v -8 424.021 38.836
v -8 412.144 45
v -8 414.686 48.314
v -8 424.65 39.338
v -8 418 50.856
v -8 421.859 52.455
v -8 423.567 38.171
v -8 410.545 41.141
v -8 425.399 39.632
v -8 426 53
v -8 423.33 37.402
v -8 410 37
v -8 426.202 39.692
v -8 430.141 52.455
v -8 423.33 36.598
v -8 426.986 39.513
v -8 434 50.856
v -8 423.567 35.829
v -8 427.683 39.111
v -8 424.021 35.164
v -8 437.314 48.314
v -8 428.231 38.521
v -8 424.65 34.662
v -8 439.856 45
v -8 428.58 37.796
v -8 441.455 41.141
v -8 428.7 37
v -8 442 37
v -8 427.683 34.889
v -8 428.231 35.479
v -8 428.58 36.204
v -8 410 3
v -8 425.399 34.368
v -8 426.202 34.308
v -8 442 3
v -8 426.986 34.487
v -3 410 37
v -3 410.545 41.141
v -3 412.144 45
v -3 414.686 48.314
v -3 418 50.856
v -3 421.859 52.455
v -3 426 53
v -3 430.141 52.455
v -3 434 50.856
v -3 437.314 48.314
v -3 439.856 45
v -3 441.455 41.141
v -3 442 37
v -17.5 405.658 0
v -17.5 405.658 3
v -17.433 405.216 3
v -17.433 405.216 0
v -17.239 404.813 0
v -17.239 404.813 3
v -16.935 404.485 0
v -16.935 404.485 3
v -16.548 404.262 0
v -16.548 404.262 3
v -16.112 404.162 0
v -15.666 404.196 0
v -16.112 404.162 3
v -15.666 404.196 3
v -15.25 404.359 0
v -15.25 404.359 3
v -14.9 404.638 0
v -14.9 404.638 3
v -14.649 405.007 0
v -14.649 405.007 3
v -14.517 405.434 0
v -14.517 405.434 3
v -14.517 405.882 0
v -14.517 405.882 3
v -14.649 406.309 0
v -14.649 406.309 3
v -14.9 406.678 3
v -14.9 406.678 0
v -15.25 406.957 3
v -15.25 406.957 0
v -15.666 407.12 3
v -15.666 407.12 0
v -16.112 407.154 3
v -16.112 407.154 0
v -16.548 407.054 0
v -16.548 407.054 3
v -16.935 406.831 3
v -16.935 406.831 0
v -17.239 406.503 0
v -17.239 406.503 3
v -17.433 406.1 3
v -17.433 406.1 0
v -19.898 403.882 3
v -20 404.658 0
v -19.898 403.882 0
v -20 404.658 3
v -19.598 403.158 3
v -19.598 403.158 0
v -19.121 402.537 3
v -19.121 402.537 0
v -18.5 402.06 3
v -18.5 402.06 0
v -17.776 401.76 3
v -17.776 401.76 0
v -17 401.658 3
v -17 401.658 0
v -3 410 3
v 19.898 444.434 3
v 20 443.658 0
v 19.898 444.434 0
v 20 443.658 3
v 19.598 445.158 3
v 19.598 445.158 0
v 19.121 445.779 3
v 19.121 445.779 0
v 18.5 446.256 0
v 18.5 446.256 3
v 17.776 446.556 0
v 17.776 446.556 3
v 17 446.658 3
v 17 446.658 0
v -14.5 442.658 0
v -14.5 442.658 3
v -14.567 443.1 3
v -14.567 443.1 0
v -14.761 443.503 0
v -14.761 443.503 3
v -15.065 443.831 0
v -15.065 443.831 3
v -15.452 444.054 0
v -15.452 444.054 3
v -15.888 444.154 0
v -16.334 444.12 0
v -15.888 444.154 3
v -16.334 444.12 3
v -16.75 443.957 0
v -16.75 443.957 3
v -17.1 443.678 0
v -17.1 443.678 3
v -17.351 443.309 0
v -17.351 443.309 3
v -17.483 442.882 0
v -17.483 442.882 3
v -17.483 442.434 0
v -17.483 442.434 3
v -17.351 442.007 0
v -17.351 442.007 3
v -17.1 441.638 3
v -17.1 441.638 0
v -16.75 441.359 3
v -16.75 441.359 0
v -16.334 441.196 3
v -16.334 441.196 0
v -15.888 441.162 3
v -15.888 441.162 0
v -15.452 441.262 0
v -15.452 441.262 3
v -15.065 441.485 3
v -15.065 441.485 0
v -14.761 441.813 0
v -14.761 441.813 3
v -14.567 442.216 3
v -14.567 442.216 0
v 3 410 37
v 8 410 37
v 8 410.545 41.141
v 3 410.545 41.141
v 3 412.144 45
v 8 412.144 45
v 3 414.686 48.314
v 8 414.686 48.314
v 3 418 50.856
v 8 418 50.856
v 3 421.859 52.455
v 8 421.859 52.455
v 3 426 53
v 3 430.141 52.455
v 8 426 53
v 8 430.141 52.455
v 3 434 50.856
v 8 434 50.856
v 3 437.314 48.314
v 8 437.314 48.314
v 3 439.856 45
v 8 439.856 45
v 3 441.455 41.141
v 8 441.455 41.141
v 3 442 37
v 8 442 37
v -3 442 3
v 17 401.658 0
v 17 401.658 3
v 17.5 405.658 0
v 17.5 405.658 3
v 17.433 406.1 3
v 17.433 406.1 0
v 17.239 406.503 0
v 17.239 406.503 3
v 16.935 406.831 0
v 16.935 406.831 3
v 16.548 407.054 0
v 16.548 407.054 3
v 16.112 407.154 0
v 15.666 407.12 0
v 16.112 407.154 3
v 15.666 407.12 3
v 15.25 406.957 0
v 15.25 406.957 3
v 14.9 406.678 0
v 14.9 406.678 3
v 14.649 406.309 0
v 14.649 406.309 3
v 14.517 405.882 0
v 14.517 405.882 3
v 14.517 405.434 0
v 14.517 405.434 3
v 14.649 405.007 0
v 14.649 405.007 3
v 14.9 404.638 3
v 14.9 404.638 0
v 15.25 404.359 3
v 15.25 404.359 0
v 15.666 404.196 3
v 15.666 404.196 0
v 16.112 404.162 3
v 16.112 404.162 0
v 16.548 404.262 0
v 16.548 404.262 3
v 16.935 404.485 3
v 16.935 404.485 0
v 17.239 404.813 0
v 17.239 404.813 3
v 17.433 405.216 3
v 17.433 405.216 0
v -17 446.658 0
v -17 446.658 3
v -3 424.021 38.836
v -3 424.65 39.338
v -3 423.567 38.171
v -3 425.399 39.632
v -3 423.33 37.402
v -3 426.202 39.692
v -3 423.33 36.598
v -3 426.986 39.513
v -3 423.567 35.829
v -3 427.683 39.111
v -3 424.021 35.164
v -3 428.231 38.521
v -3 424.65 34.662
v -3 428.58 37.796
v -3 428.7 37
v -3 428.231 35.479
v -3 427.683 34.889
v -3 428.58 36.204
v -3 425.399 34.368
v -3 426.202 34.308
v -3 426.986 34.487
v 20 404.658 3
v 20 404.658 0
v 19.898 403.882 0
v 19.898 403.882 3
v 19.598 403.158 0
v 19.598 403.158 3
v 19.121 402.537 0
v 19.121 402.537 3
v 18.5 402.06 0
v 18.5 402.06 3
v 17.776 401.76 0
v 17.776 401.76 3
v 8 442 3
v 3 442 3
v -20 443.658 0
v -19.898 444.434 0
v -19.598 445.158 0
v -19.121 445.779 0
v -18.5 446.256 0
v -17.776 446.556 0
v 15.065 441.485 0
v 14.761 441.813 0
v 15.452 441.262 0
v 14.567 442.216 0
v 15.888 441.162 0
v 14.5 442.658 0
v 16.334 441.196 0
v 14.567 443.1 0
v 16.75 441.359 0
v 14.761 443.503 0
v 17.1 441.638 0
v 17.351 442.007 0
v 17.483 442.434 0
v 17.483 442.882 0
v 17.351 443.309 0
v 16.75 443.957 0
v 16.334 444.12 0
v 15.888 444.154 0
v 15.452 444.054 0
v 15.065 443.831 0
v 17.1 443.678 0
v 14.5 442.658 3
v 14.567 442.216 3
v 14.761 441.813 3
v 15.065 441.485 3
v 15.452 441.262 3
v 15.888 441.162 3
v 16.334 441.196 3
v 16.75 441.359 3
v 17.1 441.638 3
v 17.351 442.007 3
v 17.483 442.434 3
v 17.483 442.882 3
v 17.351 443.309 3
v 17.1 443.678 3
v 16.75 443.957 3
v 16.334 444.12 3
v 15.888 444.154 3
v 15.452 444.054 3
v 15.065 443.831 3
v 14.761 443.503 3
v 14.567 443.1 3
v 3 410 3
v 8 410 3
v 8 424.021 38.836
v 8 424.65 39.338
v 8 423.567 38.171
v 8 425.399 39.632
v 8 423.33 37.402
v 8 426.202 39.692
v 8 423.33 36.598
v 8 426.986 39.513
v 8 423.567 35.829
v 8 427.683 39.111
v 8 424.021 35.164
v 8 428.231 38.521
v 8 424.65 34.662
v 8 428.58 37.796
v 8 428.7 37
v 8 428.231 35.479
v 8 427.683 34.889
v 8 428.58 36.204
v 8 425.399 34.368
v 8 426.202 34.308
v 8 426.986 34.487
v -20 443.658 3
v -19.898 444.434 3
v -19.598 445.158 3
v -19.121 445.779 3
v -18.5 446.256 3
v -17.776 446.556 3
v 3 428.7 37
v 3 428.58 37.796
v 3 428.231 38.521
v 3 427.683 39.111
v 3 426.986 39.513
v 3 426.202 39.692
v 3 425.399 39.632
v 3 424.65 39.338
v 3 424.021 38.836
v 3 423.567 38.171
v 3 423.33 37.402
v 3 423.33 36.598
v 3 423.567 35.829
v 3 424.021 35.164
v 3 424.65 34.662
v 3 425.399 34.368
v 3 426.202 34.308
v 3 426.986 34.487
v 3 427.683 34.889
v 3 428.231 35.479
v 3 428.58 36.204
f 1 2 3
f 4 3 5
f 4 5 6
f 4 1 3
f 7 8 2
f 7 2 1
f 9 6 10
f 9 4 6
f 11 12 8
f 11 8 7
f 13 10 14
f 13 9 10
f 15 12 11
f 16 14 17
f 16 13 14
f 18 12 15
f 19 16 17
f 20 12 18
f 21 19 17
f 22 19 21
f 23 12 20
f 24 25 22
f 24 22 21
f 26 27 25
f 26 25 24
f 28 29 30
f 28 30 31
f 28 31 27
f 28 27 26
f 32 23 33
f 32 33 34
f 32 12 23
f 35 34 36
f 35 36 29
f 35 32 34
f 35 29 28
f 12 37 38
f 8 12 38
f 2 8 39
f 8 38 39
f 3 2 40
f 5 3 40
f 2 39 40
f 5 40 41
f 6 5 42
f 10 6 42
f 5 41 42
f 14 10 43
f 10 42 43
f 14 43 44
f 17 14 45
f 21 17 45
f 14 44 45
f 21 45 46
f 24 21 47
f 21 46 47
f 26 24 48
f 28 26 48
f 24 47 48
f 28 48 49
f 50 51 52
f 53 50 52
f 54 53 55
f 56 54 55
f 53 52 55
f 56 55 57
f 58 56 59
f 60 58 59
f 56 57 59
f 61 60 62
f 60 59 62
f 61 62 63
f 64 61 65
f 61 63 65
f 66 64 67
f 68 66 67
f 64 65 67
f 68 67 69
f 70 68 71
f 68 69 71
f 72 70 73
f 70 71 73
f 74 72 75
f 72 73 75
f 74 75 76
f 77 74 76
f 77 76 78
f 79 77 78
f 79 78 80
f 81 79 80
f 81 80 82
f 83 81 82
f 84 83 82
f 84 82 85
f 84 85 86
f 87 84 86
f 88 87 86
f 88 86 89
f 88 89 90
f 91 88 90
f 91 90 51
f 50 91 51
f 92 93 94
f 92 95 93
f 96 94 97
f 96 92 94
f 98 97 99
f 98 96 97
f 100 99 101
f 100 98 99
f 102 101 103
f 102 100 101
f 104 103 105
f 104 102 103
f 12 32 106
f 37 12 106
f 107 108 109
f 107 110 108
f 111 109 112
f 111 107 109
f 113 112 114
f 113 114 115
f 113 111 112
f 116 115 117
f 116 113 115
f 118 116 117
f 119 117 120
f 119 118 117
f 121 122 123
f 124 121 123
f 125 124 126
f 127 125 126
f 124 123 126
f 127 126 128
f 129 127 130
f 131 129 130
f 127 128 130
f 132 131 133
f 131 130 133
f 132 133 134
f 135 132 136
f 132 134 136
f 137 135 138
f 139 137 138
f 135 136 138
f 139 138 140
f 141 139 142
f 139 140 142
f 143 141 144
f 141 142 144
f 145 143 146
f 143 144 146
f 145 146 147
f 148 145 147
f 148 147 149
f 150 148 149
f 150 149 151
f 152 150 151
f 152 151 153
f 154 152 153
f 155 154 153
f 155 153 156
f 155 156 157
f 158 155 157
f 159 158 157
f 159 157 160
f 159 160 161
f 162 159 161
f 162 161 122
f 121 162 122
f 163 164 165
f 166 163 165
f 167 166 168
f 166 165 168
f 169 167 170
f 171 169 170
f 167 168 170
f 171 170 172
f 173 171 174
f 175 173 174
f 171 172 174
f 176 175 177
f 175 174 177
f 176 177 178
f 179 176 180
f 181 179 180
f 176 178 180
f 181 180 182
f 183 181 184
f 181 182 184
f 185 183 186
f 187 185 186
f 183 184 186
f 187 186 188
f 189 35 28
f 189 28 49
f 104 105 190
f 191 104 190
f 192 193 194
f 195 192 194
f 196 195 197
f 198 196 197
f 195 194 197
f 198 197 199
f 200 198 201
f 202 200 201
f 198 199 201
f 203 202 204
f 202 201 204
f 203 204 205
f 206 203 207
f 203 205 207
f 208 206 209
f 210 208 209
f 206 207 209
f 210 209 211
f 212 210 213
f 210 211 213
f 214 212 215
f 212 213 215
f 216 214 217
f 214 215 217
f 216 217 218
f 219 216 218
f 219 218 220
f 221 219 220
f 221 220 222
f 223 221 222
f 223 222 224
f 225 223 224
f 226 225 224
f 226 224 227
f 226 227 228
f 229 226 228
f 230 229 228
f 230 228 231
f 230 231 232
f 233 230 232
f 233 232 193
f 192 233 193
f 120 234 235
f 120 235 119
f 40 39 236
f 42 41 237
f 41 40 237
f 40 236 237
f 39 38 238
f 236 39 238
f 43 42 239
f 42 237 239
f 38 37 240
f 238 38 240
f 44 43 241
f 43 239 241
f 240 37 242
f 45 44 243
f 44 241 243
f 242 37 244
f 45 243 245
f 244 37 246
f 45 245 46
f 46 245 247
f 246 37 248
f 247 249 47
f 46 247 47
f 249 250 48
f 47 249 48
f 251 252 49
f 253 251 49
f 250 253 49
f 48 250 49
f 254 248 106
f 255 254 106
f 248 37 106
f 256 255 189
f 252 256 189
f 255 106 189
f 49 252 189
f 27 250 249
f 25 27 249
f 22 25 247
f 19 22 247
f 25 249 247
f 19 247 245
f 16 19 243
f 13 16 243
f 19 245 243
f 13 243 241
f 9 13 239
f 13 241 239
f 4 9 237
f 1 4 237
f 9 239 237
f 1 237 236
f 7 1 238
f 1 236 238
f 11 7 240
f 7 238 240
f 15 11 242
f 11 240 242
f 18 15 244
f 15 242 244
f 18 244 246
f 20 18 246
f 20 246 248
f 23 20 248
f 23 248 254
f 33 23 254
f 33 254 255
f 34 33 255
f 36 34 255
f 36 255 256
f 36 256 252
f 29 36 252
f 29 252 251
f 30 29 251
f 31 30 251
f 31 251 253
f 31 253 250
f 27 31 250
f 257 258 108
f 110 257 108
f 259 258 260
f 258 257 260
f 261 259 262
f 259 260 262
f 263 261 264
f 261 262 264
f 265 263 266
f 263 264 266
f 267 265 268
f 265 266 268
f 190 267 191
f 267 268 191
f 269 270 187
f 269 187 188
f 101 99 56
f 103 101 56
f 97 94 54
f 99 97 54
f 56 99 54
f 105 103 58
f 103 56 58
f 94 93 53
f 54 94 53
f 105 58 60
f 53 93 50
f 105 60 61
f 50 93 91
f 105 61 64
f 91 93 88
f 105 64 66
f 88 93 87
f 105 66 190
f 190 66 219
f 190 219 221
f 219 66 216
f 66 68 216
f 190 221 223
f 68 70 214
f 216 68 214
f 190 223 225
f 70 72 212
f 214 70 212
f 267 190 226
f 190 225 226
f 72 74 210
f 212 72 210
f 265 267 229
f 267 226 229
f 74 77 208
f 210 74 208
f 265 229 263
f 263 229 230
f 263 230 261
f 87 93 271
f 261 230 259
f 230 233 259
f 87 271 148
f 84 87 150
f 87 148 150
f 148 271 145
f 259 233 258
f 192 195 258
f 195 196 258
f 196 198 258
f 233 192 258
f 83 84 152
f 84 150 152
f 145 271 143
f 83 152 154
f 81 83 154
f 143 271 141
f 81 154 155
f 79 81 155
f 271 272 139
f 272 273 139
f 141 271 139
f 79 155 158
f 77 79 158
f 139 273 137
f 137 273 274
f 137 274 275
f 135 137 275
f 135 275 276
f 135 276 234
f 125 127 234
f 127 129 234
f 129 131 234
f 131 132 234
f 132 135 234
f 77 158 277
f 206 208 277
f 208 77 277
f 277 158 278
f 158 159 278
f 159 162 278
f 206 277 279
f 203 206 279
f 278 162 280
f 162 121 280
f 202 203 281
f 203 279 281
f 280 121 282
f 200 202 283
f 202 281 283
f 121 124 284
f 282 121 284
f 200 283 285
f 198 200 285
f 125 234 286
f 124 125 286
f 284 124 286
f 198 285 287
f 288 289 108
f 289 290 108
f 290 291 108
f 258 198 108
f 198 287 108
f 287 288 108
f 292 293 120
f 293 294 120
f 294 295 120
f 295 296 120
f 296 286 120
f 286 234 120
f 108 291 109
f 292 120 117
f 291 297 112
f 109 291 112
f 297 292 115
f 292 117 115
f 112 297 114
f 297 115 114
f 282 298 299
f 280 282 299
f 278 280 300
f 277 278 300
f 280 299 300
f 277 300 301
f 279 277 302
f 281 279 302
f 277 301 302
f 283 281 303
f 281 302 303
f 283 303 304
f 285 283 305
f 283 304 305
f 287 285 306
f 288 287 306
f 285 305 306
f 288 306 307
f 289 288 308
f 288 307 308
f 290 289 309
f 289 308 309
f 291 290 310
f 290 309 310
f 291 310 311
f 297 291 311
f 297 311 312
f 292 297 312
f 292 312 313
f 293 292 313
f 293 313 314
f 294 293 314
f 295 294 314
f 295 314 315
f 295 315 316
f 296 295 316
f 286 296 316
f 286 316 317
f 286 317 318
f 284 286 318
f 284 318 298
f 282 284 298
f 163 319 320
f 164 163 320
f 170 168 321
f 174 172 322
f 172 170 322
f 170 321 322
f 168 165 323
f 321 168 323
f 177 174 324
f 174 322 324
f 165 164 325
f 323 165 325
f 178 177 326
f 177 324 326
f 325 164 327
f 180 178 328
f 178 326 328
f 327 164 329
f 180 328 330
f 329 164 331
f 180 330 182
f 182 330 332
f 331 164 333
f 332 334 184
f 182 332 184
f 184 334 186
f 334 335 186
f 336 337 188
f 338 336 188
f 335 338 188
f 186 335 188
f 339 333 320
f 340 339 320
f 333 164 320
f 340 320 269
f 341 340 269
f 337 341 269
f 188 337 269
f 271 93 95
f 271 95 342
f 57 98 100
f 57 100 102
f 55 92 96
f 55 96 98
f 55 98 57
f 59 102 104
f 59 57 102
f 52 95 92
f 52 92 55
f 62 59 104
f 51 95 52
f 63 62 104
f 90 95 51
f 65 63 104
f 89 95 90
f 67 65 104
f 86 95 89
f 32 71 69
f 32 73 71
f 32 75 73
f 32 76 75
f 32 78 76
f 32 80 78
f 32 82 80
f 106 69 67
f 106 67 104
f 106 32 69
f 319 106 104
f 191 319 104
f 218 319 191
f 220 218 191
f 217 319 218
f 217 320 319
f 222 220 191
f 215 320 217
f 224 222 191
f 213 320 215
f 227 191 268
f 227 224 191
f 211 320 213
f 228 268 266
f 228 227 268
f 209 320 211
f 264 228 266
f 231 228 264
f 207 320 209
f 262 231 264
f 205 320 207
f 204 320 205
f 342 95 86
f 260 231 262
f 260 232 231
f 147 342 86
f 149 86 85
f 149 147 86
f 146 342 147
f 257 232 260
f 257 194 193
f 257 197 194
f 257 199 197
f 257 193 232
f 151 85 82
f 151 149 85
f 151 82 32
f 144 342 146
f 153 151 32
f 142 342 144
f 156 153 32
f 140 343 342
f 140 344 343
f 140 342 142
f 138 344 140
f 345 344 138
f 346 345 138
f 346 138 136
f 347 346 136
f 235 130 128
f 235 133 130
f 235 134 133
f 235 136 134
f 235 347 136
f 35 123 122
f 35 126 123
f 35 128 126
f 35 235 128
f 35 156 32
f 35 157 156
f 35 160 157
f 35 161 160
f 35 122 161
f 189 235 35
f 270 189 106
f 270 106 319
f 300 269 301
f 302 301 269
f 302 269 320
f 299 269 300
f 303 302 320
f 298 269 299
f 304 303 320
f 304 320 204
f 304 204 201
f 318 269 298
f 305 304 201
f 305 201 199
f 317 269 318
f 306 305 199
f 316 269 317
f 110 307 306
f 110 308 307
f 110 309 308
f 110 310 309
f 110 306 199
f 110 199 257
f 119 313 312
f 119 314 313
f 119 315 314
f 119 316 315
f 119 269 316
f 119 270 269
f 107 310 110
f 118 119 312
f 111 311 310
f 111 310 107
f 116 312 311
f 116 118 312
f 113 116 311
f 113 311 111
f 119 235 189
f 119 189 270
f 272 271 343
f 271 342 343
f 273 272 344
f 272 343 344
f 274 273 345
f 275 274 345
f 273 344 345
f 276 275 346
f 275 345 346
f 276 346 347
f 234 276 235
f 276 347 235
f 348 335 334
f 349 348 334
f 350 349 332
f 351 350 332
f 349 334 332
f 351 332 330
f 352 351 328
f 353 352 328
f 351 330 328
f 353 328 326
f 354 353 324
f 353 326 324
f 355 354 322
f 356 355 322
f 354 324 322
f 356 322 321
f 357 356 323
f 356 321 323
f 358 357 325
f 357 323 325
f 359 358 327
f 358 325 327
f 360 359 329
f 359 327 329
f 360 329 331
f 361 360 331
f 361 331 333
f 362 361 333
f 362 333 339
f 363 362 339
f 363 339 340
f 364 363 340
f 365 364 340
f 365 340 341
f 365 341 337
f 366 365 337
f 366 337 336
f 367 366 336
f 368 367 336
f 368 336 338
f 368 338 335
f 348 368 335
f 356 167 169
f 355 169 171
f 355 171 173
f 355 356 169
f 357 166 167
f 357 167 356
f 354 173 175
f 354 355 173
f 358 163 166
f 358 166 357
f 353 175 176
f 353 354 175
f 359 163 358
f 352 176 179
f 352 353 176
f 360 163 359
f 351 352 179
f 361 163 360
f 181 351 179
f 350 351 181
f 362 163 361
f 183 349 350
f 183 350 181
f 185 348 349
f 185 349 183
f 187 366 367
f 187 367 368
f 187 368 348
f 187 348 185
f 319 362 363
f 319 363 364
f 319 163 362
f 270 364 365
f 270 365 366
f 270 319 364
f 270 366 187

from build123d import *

# Parameters (mm, degrees)
SKETCH1_W           = 40
SKETCH1_H           = 45
BOSS_EXTRUDE1_DEPTH = 3
SKETCH2_W           = 5
SKETCH2_H           = 32
BOSS_EXTRUDE2_DEPTH = 50
SKETCH3_R           = 2.7
CUT_EXTRUDE1_DEPTH  = 451.662125067
FILLET2_R           = 3
SKETCH4_R           = 1.5
CUT_EXTRUDE2_DEPTH  = 450.892599372


with BuildPart() as part:
    # Sketch1 → Boss-Extrude1 (new body)
    with BuildSketch(Plane.XY):
        with Locations((0, 424.157979857)):
            Rectangle(SKETCH1_W, SKETCH1_H)
    extrude(amount=BOSS_EXTRUDE1_DEPTH)

    # Sketch2 → Boss-Extrude2 (add)
    with BuildSketch(Plane.XY.offset(3)):
        with Locations((5.5, 426)):
            Rectangle(SKETCH2_W, SKETCH2_H)
        with Locations((-5.5, 426)):
            Rectangle(SKETCH2_W, SKETCH2_H)
    extrude(amount=BOSS_EXTRUDE2_DEPTH)

    # Sketch3 → Cut-Extrude1 (cut, through all)
    with BuildSketch(Plane(origin=(8, 0, 0), x_dir=(0, 0, -1), z_dir=(1, 0, 0))):
        with Locations(Location((-37, 426, 0), (0, 0, 90))):
            Circle(SKETCH3_R)
        with BuildLine():
            Line((-37, 442), (-57.90422328, 442))
            Line((-57.90422328, 442), (-57.90422328, 410))
            Line((-57.90422328, 410), (-37, 410))
            ThreePointArc((-37, 410), (-53, 426), (-37, 442))
        make_face()
    extrude(amount=-CUT_EXTRUDE1_DEPTH, mode=Mode.SUBTRACT)

    # Fillet2
    fillet2_edges = [part.edges().sort_by_distance(p)[0] for p in [
        (-20, 446.657979857, 1.5),
        (20, 446.657979857, 1.5),
        (20, 401.657979857, 1.5),
        (-20, 401.657979857, 1.5),
    ]]
    fillet(fillet2_edges, radius=FILLET2_R)

    # Sketch4 → Cut-Extrude2 (cut, through all)
    with BuildSketch(Plane.XY.offset(3)):
        with Locations((-16, 442.657979857)):
            Circle(SKETCH4_R)
        with Locations(Location((-16, 405.657979857, 0), (0, 0, 180))):
            Circle(SKETCH4_R)
        with Locations((16, 405.657979857)):
            Circle(SKETCH4_R)
        with Locations(Location((16, 442.657979857, 0), (0, 0, 180))):
            Circle(SKETCH4_R)
    extrude(amount=-CUT_EXTRUDE2_DEPTH, mode=Mode.SUBTRACT)


solid = part.part
